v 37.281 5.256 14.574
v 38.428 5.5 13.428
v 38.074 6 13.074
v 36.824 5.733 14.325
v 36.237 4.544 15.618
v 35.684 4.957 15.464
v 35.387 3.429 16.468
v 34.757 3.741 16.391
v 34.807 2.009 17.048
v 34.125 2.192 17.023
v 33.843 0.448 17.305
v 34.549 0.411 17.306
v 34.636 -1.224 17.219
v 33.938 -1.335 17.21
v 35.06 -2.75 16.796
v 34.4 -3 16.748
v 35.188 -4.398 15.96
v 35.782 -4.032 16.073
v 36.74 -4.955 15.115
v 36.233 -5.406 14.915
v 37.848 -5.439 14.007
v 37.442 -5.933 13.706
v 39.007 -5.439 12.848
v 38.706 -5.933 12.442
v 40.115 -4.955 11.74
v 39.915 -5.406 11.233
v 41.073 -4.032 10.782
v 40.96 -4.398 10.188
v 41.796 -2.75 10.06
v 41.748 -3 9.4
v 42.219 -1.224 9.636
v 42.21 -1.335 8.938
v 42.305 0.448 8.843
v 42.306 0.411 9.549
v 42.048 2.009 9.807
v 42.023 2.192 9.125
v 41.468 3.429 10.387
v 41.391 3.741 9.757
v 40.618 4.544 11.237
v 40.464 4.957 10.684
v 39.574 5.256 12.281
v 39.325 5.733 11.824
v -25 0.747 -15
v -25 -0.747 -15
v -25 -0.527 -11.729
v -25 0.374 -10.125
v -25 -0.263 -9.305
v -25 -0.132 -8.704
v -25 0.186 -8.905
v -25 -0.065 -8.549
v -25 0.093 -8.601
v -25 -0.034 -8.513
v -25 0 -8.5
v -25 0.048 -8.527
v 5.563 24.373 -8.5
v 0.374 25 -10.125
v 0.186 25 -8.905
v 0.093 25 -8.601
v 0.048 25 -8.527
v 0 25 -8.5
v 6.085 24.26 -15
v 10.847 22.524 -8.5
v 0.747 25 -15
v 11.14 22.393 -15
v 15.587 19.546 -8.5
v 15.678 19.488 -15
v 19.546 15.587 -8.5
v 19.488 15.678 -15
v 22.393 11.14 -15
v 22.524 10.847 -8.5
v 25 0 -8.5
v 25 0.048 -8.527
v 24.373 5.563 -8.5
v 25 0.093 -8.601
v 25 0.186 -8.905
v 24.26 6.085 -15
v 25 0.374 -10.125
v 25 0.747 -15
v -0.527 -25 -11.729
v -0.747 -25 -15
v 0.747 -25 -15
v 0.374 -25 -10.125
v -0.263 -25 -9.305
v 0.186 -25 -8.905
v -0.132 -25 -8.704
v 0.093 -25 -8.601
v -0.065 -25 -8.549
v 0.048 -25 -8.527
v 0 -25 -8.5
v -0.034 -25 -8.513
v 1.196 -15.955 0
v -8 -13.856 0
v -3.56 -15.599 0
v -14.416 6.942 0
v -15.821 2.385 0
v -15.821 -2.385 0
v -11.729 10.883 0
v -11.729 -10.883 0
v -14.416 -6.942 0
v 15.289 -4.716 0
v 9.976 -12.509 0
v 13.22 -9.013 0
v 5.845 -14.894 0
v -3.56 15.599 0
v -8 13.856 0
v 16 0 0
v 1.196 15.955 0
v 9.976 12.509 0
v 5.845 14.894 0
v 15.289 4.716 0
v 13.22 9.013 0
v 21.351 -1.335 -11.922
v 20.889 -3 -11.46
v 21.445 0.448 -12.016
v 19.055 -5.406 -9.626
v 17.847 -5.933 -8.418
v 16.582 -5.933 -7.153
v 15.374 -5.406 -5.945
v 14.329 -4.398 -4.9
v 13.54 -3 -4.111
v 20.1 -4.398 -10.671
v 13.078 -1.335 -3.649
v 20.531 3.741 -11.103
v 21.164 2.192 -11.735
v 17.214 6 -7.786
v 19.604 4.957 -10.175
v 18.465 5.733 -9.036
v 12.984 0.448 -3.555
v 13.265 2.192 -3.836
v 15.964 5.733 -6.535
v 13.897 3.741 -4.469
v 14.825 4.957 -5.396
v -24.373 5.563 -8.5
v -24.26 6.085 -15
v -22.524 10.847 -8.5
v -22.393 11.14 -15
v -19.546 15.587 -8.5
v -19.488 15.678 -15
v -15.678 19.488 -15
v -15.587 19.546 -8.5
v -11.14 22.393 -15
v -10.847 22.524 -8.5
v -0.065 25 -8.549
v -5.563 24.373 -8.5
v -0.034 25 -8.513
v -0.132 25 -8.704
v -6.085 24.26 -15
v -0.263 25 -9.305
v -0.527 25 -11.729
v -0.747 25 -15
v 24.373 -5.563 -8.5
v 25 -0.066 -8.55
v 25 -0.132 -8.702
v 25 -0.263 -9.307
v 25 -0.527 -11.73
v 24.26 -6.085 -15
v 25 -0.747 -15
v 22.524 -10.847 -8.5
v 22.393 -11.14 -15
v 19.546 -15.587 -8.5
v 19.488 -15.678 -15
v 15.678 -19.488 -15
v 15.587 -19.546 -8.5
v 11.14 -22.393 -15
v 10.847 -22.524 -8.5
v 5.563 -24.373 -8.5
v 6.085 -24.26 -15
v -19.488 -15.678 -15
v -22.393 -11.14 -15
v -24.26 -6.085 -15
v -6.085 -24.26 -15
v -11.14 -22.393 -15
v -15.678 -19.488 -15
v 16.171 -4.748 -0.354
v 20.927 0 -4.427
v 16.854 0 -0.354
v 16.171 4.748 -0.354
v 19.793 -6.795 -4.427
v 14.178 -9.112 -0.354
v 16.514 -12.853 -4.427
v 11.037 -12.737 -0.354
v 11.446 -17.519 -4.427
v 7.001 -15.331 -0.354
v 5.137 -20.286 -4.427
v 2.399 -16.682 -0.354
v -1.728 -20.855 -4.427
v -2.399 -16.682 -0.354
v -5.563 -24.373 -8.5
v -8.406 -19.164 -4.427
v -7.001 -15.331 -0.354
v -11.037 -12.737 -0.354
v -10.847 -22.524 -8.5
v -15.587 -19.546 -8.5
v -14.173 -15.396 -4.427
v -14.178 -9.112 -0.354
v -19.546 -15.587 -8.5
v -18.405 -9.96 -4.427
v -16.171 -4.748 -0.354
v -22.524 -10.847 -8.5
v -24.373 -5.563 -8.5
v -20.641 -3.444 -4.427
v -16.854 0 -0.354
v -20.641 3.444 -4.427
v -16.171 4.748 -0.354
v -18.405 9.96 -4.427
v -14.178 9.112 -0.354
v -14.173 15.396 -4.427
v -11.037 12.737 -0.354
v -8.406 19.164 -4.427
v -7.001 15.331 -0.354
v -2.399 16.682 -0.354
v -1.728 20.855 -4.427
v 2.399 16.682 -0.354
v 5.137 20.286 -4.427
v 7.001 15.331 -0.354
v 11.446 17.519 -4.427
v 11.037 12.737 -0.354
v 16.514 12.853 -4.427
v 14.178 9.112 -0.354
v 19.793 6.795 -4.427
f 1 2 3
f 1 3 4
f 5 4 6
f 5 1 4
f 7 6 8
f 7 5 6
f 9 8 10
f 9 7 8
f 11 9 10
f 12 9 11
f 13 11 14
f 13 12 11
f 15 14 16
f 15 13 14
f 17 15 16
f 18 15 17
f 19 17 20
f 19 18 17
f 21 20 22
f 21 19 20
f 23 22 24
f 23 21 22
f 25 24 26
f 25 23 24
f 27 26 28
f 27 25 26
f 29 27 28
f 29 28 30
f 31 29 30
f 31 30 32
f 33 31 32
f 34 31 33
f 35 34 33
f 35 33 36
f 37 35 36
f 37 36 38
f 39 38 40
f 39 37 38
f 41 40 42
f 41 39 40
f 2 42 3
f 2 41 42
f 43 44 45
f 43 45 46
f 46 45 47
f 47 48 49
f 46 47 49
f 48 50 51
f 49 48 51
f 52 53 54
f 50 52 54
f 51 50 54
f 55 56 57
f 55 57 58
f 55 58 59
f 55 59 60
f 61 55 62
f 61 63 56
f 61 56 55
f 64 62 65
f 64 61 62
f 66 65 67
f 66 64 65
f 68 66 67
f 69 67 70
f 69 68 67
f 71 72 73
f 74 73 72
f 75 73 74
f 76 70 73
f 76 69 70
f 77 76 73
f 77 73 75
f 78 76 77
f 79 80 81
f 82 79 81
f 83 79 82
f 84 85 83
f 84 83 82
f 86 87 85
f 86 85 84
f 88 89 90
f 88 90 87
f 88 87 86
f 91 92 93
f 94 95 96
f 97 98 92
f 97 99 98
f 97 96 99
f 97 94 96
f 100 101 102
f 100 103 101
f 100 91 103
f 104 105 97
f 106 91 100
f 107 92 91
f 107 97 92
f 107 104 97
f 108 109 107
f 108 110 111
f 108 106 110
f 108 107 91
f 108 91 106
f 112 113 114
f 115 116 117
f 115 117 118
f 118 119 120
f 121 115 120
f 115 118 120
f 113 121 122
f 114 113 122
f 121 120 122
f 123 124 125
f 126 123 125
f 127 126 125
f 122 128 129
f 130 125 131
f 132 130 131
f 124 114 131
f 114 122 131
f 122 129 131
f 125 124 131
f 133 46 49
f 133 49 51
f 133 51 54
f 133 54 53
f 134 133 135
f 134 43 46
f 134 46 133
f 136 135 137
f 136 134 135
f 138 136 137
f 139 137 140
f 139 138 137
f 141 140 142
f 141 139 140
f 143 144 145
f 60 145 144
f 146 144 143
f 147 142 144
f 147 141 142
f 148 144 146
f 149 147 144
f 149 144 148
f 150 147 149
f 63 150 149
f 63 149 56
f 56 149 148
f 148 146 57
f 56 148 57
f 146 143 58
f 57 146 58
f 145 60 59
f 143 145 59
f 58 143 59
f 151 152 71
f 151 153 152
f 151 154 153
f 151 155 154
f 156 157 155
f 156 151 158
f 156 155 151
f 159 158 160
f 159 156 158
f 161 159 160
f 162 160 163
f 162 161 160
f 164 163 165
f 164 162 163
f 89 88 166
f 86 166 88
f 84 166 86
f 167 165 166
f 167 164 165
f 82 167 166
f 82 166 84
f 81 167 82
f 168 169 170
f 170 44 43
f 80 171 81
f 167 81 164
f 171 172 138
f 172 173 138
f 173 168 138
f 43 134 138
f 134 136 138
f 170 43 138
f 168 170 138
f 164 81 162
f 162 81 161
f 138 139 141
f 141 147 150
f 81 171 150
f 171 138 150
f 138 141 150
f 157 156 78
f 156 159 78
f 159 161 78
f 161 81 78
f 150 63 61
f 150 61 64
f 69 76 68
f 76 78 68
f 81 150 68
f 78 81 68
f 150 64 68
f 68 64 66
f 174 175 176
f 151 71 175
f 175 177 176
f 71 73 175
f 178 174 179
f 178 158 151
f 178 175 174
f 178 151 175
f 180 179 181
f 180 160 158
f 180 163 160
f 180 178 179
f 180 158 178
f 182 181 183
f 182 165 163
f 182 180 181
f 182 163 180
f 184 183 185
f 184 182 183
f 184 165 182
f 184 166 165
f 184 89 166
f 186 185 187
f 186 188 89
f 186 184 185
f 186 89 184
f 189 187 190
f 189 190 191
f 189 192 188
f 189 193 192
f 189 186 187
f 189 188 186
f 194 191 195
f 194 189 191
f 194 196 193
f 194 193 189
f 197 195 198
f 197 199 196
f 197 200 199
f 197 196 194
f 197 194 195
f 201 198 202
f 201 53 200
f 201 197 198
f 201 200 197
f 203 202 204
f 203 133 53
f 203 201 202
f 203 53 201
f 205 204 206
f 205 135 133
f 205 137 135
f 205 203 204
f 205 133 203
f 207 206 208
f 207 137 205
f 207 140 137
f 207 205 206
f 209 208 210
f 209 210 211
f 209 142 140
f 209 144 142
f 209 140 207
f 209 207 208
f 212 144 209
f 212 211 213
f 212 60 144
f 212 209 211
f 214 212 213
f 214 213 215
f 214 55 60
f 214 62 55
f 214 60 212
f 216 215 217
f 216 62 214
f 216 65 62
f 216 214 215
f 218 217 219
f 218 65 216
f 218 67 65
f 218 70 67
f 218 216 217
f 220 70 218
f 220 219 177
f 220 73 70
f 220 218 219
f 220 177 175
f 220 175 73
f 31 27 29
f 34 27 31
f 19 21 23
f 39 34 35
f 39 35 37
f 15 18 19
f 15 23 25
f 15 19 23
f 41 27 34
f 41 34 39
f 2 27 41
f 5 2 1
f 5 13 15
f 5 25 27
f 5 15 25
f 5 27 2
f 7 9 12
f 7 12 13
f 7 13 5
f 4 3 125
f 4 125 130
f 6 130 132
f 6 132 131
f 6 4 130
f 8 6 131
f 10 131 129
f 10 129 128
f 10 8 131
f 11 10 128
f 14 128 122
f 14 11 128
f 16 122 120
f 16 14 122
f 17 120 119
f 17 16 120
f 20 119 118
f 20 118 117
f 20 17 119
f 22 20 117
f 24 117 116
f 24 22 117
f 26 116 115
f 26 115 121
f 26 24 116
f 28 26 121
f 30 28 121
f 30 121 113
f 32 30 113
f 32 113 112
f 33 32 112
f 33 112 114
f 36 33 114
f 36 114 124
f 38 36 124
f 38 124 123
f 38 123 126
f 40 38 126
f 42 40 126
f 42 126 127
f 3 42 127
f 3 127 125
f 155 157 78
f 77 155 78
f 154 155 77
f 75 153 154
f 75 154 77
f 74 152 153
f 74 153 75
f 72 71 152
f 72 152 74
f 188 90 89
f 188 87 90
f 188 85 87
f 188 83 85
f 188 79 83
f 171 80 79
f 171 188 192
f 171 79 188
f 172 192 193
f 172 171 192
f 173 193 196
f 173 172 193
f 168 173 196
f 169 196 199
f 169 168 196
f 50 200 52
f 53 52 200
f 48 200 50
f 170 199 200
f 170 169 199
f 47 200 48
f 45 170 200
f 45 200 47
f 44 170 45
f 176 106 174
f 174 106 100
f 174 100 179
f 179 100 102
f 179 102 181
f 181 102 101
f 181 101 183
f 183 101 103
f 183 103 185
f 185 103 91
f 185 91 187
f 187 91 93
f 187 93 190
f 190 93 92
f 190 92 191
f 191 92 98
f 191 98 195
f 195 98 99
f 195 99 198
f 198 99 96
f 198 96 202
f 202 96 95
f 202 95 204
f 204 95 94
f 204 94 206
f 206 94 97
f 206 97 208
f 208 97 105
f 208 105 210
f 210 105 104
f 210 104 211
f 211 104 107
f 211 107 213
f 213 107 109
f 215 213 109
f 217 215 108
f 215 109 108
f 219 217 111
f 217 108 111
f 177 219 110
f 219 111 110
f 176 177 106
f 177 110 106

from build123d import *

# Parameters (mm, degrees)
F0_W          = 50
F0_H          = 50
F1_DEPTH      = 15
F2_SIZE       = 8.5
F3_R          = 6
F6_DEPTH      = 25
F6_DEPTH_BACK = 5
F7_SIZE       = 0.5
F7_2_SIZE     = 0.5


# Not quite as in the source:
# - a feature names something its author has since deleted; it is built from what else it names


with BuildPart() as f1:
    # F0 (on Top) → F1 (new body)
    with BuildSketch(Plane.XY):
        Rectangle(F0_W, F0_H)
    extrude(amount=-F1_DEPTH)

    # F2
    f2_edges = [f1.edges().sort_by_distance(p)[0] for p in [
        (25, 0, 0),
    ]]
    chamfer(f2_edges, length=F2_SIZE)

    # F4 (on Front) → F5 (revolve, cut)
    with BuildSketch(Plane.XZ):
        Polygon((16.5, 0), (25, -8.5), (25.0111613423, -15), (57.6415769756, -15), (57.6415769756, 0), align=None)
    revolve(axis=Axis((0, 0, -4.25), (0, 0, -1)), mode=Mode.SUBTRACT)

    # F7#2
    f7_2_edges = [f1.edges().sort_by_distance(p)[0] for p in [
        (-16.5, 0, 0),
    ]]
    chamfer(f7_2_edges, length=F7_2_SIZE)


with BuildPart() as f6:
    # F3 (on face) → F6 (new body, two sides)
    with BuildSketch(Plane(origin=(8.25, 0, 8.25), x_dir=(0, 1, 0), z_dir=(0.7071067812, 0, 0.7071067812))) as f6_sk:
        with Locations((0, -17.6776695297)):
            Circle(F3_R)
    extrude(amount=F6_DEPTH)
    extrude(f6_sk.sketch, amount=-F6_DEPTH_BACK)

    # F7
    f7_edges = [f6.edges().sort_by_distance(p)[0] for p in [
        (38.42767, -6, 13.42767),
    ]]
    chamfer(f7_edges, length=F7_SIZE)


solid = Compound([f1.part, f6.part])
